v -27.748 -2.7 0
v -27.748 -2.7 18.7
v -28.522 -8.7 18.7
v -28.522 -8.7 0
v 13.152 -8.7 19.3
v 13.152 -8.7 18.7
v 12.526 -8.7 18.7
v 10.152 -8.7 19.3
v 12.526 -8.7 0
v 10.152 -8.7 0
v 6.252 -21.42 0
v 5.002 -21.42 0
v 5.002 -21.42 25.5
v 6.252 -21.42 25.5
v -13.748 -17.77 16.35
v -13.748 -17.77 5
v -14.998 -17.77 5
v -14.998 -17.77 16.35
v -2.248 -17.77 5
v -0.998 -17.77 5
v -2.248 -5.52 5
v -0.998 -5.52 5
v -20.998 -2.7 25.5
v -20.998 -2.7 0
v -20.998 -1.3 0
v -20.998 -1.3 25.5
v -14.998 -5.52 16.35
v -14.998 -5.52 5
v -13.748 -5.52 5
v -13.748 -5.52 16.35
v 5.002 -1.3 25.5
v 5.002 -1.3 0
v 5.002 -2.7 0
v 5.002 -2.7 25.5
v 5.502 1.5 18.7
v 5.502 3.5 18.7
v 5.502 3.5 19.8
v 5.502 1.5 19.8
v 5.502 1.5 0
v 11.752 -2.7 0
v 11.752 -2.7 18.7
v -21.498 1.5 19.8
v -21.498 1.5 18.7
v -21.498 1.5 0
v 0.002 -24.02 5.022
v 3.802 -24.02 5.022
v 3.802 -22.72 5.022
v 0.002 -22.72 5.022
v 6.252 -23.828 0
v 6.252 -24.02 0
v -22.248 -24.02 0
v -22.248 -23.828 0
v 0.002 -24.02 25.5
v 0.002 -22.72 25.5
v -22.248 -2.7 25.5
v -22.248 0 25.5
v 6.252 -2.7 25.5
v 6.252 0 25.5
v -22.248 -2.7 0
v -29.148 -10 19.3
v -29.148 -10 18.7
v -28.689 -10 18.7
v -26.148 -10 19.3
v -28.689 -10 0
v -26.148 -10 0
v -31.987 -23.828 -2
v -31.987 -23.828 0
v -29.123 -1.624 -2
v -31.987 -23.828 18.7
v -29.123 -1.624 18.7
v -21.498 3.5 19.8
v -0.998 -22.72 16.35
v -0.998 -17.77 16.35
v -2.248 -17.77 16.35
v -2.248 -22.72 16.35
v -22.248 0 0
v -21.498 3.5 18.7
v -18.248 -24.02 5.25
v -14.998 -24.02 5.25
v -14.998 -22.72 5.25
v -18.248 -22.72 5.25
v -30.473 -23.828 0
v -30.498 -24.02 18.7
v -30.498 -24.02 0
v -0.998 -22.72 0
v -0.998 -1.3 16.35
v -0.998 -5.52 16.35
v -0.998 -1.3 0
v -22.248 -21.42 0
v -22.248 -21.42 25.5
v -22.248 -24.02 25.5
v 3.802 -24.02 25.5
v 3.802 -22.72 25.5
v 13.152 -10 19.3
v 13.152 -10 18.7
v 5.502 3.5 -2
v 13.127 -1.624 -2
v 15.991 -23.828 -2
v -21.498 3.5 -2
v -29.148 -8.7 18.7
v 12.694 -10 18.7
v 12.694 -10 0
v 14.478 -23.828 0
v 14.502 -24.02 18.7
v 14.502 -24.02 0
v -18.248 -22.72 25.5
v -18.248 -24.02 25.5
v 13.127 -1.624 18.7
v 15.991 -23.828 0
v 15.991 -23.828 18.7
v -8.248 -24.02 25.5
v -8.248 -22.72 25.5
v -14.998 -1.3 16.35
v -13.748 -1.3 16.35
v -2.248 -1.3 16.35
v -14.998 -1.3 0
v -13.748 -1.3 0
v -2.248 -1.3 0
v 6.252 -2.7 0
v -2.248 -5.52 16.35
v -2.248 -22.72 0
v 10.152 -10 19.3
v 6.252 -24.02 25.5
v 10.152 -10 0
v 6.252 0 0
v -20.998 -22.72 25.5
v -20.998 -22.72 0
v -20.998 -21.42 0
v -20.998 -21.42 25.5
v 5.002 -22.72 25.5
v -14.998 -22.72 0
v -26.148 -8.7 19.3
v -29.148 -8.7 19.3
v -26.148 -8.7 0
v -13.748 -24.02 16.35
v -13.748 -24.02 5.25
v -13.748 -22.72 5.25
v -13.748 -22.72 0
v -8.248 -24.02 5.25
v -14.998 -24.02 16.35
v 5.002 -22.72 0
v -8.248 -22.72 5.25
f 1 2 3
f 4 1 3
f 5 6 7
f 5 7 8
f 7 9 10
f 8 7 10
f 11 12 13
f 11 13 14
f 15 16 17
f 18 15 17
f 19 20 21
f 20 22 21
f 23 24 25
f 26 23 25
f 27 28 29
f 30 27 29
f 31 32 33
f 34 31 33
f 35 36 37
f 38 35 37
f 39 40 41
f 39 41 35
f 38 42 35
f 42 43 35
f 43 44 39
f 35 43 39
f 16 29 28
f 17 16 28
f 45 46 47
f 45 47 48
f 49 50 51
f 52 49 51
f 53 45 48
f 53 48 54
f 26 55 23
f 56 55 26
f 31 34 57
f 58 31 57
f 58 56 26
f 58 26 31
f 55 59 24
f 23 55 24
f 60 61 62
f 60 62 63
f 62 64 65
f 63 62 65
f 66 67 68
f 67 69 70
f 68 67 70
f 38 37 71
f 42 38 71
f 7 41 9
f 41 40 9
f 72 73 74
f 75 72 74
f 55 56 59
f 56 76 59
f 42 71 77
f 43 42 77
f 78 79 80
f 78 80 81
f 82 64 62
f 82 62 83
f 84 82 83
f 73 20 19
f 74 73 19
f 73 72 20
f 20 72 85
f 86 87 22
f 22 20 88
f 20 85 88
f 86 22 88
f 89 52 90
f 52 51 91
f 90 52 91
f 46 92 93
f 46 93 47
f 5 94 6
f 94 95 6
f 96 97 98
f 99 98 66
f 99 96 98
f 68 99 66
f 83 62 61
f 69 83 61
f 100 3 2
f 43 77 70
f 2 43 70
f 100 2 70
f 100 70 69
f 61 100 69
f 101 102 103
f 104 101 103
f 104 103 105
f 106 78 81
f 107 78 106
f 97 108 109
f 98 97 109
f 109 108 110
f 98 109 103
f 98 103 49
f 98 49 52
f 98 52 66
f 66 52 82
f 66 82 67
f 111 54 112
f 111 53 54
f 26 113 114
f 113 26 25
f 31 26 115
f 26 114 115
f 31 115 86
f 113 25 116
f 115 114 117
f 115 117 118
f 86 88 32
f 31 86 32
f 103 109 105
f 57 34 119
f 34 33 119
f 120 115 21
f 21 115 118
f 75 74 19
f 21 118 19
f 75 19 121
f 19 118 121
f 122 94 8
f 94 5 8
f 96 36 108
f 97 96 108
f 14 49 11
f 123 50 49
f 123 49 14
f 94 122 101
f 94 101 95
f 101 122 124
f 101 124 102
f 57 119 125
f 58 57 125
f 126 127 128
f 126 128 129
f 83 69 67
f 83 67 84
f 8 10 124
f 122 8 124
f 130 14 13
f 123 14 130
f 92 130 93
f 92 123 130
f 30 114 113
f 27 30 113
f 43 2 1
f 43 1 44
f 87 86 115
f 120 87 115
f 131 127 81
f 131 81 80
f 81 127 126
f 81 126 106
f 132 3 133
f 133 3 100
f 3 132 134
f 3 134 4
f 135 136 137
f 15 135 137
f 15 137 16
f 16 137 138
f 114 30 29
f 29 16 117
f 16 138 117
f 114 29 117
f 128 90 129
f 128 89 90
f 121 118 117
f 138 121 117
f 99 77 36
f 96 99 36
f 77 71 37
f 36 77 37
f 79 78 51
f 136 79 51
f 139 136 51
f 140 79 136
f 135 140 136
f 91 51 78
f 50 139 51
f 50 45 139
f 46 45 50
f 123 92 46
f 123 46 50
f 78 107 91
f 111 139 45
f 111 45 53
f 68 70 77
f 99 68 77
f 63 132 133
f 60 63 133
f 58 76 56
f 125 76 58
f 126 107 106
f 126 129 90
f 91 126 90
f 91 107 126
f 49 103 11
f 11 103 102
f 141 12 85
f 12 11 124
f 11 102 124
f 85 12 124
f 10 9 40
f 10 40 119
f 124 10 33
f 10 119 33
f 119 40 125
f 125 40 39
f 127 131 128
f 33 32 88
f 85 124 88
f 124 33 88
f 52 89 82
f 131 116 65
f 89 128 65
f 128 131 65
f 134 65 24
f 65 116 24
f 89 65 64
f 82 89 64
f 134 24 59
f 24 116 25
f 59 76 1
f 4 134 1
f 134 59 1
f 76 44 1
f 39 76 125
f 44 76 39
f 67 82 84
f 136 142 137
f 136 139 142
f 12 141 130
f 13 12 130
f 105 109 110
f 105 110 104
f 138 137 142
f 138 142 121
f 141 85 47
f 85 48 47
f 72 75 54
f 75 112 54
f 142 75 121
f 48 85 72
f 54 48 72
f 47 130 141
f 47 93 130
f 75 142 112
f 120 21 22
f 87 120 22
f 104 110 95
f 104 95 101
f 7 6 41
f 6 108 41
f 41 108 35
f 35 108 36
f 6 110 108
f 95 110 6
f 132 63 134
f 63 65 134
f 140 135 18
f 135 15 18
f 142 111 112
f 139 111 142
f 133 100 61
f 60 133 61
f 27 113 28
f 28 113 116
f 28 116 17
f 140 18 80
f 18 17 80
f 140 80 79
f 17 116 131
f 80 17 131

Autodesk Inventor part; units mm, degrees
ref_plane "YZ Plane" through (0, 0, 0) normal (1, 0, 0) x (0, 1, 0)
ref_plane "XZ Plane" through (0, 0, 0) normal (0, 1, 0) x (-1, 0, 0)
ref_plane "XY Plane" through (0, 0, 0) normal (0, 0, 1) x (1, 0, 0)
sketch "Skizze1" plane through (0, 0, 0) normal (0, 0, 1) x (1, 0, 0)
  line L0 (-20.9977, -1.3) -> (5.0023, -1.3)
  line L1 (-22.2477, 0) -> (6.2523, 0)
  line L2 (-22.2477, 0) -> (-22.2477, -2.7)
  line L3 (-22.2477, -2.7) -> (-20.9977, -2.7)
  line L4 (-20.9977, -2.7) -> (-20.9977, -1.3)
  line L5 (5.0023, -1.3) -> (5.0023, -2.7)
  line L6 (5.0023, -2.7) -> (6.2523, -2.7)
  line L7 (6.2523, -2.7) -> (6.2523, 0)
  point P0 (0, 0)
  dimension "d0" = 26
  dimension "d1" = 28.5
  dimension "d2" = 1.25
  dimension "d33" = 1.3
  dimension "d37" = 2.7
  dimension "d38" = 2.7
  dimension "d39" = 0
extrude "Extrusion1" add sketch "Skizze1" along normal blind 25.5
sketch "Skizze2" plane through (0, 0, 0) normal (0, 0, -1) x (-1, 0, 0)
  line L0 (20.9977, -1.3) -> (-5.0023, -1.3) projected
  line L1 (20.9977, -2.7) -> (20.9977, -1.3) projected
  line L2 (-5.0023, -1.3) -> (-5.0023, -2.7) projected
  line L3 (0.9977, -1.3) -> (2.2477, -1.3)
  line L4 (2.2477, -1.3) -> (2.2477, -5.5195)
  line L5 (2.2477, -5.5195) -> (0.9977, -5.5195)
  line L6 (0.9977, -5.5195) -> (0.9977, -1.3)
  line L7 (13.7477, -1.3) -> (14.9977, -1.3)
  line L8 (14.9977, -1.3) -> (14.9977, -5.5195)
  line L9 (14.9977, -5.5195) -> (13.7477, -5.5195)
  line L10 (13.7477, -5.5195) -> (13.7477, -1.3)
  point P0 (0, 0)
  dimension "d5" = 11.5
  dimension "d6" = 1.25
  dimension "d7" = 1.25
  dimension "d8" = 6
  dimension "d9" = 6
extrude "Extrusion2" add sketch "Skizze2" against normal blind 16.35
sketch "Skizze3" plane through (0, 0, 0) normal (0, 0, -1) x (-1, 0, 0)
  line L0 (0.9977, -5.5195) -> (2.2477, -5.5195)
  line L1 (2.2477, -5.5195) -> (2.2477, -17.7695)
  line L2 (2.2477, -17.7695) -> (0.9977, -17.7695)
  line L3 (0.9977, -17.7695) -> (0.9977, -5.5195)
  line L4 (13.7477, -5.5195) -> (14.9977, -5.5195)
  line L5 (14.9977, -5.5195) -> (14.9977, -17.7695)
  line L6 (14.9977, -17.7695) -> (13.7477, -17.7695)
  line L7 (13.7477, -17.7695) -> (13.7477, -5.5195)
  point P0 (0, 0)
  dimension "d12" = 12.25
  dimension "d15" = 12.25
extrude "Extrusion3" add sketch "Skizze3" against normal blind 5
sketch "Skizze4" plane through (0, 0, 0) normal (0, 0, -1) x (-1, 0, 0)
  line L0 (0.9977, -17.7695) -> (2.2477, -17.7695)
  line L1 (2.2477, -17.7695) -> (2.2477, -24.0195)
  line L2 (2.2477, -24.0195) -> (0.9977, -24.0195)
  line L3 (0.9977, -24.0195) -> (0.9977, -17.7695)
  line L4 (13.7477, -17.7695) -> (14.9977, -17.7695)
  line L5 (14.9977, -17.7695) -> (14.9977, -24.0195)
  line L6 (14.9977, -24.0195) -> (13.7477, -24.0195)
  line L7 (13.7477, -24.0195) -> (13.7477, -17.7695)
  point P0 (0, 0)
  dimension "d16" = 6.25
  dimension "d17" = 6.25
extrude "Extrusion4" add sketch "Skizze4" against normal blind 16.35
sketch "Skizze5" plane through (-14.9977, -24.0195, 0) normal (0, -1, 0) x (1, 0, 0)
  line L0 (-7.25, 0) -> (-7.25, 25.5) projected
  line L1 (21.25, 0) -> (21.25, 25.5) projected
  line L2 (-7.25, 25.5) -> (-7.25, 0)
  line L3 (21.25, 0) -> (-7.25, 0)
  line L4 (21.25, 0) -> (21.25, 25.5)
  line L5 (21.25, 25.5) -> (18.8, 25.5)
  line L6 (18.8, 25.5) -> (18.8, 5.0223)
  line L7 (18.8, 5.0223) -> (15, 5.0223)
  line L8 (15, 5.0223) -> (15, 25.5)
  line L9 (15, 25.5) -> (6.75, 25.5)
  line L10 (6.75, 25.5) -> (6.75, 5.25)
  line L11 (6.75, 5.25) -> (-3.25, 5.25)
  line L12 (-3.25, 5.25) -> (-3.25, 25.5)
  line L13 (-3.25, 25.5) -> (-7.25, 25.5)
  point P0 (14.9977, 0)
  dimension "d20" = 5.25
  dimension "d21" = 8.25
  dimension "d22" = 3.8
  dimension "d23" = 10
  dimension "d24" = 4
  dimension "d25" = 2.45
extrude "Extrusion5" add sketch "Skizze5" against normal blind 1.3
sketch "Skizze6" plane through (-14.9977, -22.7195, 0) normal (0, 1, 0) x (1, 0, 0)
  line L0 (-3.25, -25.5) -> (-7.25, -25.5) projected
  line L1 (14, 0) -> (21.25, 0) projected
  line L2 (21.25, -25.5) -> (21.25, 0)
  line L3 (-7.25, 0) -> (-6, 0)
  line L4 (-6, 0) -> (-6, -25.5)
  line L5 (-6, -25.5) -> (-7.25, -25.5)
  line L6 (-7.25, -25.5) -> (-7.25, 0)
  line L7 (21.25, 0) -> (20, 0)
  line L8 (20, 0) -> (20, -25.5)
  line L9 (20, -25.5) -> (21.25, -25.5)
  line L10 (21.25, -25.5) -> (21.25, 0)
  point P0 (14.9977, 0)
  point P1 (18.8, -25.5)
  dimension "d28" = 1.25
  dimension "d30" = 1.25
extrude "Extrusion6" add sketch "Skizze6" along normal blind 1.3
sketch "Skizze7" plane through (0, 0, 0) normal (0, 0, -1) x (-1, 0, 0)
  line L0 (22.2477, 0) -> (22.2477, -2.7) projected
  line L1 (-6.2523, -2.7) -> (-6.2523, 0) projected
  line L2 (-13.1523, -8.7) -> (-10.1523, -8.7)
  line L3 (-10.1523, -8.7) -> (-10.1523, -10)
  line L4 (-10.1523, -10) -> (-13.1523, -10)
  line L5 (-13.1523, -10) -> (-13.1523, -8.7)
  line L6 (26.1477, -8.7) -> (29.1477, -8.7)
  line L7 (29.1477, -8.7) -> (29.1477, -10)
  line L8 (29.1477, -10) -> (26.1477, -10)
  line L9 (26.1477, -10) -> (26.1477, -8.7)
  line L10 (22.2477, -2.7) -> (20.9977, -2.7) projected
  line L11 (-5.0023, -2.7) -> (-6.2523, -2.7) projected
  point P0 (0, 0)
  dimension "d40" = 3.9
  dimension "d41" = 3.9
  dimension "d42" = 1.3
  dimension "d43" = 3
  dimension "d44" = 3
  dimension "d45" = 1.3
  dimension "d68" = 6
  dimension "d69" = 6
extrude "Extrusion7" add sketch "Skizze7" against normal blind 19.3
ref_plane "Arbeitsebene1" through (-22.2477, 3.5, 0) normal (0, 1, 0) x (1, 0, 0)
sketch "Skizze9" plane through (-22.2477, 3.5, 0) normal (0, 1, 0) x (1, 0, 0)
  line L0 (28.5, 0) -> (28.5, -25.5)
  line L1 (28.5, 0) -> (0, 0)
  line L2 (0, 0) -> (0, -25.5)
  line L3 (0.75, 0) -> (27.75, 0)
  line L4 (27.75, 0) -> (27.75, -19.8)
  line L5 (27.75, -19.8) -> (0.75, -19.8)
  line L6 (0.75, -19.8) -> (0.75, 0)
  point P0 (22.2477, 0)
  point P1 (22.2477, 0)
  dimension "d55" = 27
  dimension "d56" = 19.8
  dimension "d57" = 0.75
  dimension "d58" = 0.75
extrude "Extrusion9" add sketch "Skizze9" against normal blind 2
sketch "Skizze11" plane through (0, 0, 0) normal (0, 0, -1) x (-1, 0, 0)
  line L0 (22.2477, -24.0195) -> (22.2477, -21.4195) projected
  line L1 (22.2477, 0) -> (22.2477, -2.7) projected
  line L2 (-6.2523, -2.7) -> (-6.2523, 0) projected
  line L3 (-6.2523, -24.0195) -> (-6.2523, -21.4195) projected
  line L4 (-11.7523, -2.7) -> (-14.5023, -24.0195)
  line L5 (27.7477, -2.7) -> (30.4977, -24.0195)
  line L6 (-5.5023, 3.5) -> (-5.5023, 1.5) projected
  line L7 (21.4977, 3.5) -> (21.4977, 1.5) projected
  line L8 (-11.7523, -2.7) -> (-5.5023, 1.5)
  line L9 (-5.5023, 1.5) -> (-5.5023, 3.5)
  line L10 (27.7477, -2.7) -> (21.4977, 1.5)
  line L11 (21.4977, 1.5) -> (21.4977, 3.5)
  line L12 (21.4977, 3.5) -> (29.1227, -1.624)
  line L13 (29.1227, -1.624) -> (31.9868, -23.8275)
  line L14 (31.9868, -23.8275) -> (30.4977, -24.0195)
  line L15 (-5.5023, 1.5) -> (-5.5023, 3.5)
  line L16 (-5.5023, 3.5) -> (-13.1273, -1.624)
  line L17 (-13.1273, -1.624) -> (-15.9913, -23.8275)
  line L18 (-15.9913, -23.8275) -> (-14.5023, -24.0195)
  point P0 (0, 0)
  dimension "d65" = 28.5
  dimension "d66" = 8.25
  dimension "d67" = 8.25
  dimension "d70" = 5.5
  dimension "d71" = 5.5
extrude "Extrusion10" add sketch "Skizze11" against normal blind 18.7
sketch "Skizze12" plane through (0, 0, 0) normal (0, 0, -1) x (-1, 0, 0)
  line L0 (31.9868, -23.8275) -> (29.1227, -1.624) projected
  line L1 (29.1227, -1.624) -> (21.4977, 3.5) projected
  line L2 (21.4977, 3.5) -> (-5.5023, 3.5) projected
  line L3 (-5.5023, 3.5) -> (-13.1273, -1.624) projected
  line L4 (-13.1273, -1.624) -> (-15.9913, -23.8275) projected
  line L5 (-15.9913, -23.8275) -> (31.9868, -23.8275)
  point P0 (0, 0)
extrude "Extrusion11" add sketch "Skizze12" along normal blind 2
equation "\"d38\" = d37"
equation "\"d7\" = d6"
equation "\"d15\" = d12"
equation "\"d17\" = d16"
equation "\"d41\" = d40"
equation "\"d44\" = d43"
equation "\"d45\" = d42"
equation "\"d69\" = d68"
equation "\"d57\" = d58"
equation "\"d66\" = d67"
equation "\"d70\" = d71"
properties part number "conrad_schaltsteckdose"
